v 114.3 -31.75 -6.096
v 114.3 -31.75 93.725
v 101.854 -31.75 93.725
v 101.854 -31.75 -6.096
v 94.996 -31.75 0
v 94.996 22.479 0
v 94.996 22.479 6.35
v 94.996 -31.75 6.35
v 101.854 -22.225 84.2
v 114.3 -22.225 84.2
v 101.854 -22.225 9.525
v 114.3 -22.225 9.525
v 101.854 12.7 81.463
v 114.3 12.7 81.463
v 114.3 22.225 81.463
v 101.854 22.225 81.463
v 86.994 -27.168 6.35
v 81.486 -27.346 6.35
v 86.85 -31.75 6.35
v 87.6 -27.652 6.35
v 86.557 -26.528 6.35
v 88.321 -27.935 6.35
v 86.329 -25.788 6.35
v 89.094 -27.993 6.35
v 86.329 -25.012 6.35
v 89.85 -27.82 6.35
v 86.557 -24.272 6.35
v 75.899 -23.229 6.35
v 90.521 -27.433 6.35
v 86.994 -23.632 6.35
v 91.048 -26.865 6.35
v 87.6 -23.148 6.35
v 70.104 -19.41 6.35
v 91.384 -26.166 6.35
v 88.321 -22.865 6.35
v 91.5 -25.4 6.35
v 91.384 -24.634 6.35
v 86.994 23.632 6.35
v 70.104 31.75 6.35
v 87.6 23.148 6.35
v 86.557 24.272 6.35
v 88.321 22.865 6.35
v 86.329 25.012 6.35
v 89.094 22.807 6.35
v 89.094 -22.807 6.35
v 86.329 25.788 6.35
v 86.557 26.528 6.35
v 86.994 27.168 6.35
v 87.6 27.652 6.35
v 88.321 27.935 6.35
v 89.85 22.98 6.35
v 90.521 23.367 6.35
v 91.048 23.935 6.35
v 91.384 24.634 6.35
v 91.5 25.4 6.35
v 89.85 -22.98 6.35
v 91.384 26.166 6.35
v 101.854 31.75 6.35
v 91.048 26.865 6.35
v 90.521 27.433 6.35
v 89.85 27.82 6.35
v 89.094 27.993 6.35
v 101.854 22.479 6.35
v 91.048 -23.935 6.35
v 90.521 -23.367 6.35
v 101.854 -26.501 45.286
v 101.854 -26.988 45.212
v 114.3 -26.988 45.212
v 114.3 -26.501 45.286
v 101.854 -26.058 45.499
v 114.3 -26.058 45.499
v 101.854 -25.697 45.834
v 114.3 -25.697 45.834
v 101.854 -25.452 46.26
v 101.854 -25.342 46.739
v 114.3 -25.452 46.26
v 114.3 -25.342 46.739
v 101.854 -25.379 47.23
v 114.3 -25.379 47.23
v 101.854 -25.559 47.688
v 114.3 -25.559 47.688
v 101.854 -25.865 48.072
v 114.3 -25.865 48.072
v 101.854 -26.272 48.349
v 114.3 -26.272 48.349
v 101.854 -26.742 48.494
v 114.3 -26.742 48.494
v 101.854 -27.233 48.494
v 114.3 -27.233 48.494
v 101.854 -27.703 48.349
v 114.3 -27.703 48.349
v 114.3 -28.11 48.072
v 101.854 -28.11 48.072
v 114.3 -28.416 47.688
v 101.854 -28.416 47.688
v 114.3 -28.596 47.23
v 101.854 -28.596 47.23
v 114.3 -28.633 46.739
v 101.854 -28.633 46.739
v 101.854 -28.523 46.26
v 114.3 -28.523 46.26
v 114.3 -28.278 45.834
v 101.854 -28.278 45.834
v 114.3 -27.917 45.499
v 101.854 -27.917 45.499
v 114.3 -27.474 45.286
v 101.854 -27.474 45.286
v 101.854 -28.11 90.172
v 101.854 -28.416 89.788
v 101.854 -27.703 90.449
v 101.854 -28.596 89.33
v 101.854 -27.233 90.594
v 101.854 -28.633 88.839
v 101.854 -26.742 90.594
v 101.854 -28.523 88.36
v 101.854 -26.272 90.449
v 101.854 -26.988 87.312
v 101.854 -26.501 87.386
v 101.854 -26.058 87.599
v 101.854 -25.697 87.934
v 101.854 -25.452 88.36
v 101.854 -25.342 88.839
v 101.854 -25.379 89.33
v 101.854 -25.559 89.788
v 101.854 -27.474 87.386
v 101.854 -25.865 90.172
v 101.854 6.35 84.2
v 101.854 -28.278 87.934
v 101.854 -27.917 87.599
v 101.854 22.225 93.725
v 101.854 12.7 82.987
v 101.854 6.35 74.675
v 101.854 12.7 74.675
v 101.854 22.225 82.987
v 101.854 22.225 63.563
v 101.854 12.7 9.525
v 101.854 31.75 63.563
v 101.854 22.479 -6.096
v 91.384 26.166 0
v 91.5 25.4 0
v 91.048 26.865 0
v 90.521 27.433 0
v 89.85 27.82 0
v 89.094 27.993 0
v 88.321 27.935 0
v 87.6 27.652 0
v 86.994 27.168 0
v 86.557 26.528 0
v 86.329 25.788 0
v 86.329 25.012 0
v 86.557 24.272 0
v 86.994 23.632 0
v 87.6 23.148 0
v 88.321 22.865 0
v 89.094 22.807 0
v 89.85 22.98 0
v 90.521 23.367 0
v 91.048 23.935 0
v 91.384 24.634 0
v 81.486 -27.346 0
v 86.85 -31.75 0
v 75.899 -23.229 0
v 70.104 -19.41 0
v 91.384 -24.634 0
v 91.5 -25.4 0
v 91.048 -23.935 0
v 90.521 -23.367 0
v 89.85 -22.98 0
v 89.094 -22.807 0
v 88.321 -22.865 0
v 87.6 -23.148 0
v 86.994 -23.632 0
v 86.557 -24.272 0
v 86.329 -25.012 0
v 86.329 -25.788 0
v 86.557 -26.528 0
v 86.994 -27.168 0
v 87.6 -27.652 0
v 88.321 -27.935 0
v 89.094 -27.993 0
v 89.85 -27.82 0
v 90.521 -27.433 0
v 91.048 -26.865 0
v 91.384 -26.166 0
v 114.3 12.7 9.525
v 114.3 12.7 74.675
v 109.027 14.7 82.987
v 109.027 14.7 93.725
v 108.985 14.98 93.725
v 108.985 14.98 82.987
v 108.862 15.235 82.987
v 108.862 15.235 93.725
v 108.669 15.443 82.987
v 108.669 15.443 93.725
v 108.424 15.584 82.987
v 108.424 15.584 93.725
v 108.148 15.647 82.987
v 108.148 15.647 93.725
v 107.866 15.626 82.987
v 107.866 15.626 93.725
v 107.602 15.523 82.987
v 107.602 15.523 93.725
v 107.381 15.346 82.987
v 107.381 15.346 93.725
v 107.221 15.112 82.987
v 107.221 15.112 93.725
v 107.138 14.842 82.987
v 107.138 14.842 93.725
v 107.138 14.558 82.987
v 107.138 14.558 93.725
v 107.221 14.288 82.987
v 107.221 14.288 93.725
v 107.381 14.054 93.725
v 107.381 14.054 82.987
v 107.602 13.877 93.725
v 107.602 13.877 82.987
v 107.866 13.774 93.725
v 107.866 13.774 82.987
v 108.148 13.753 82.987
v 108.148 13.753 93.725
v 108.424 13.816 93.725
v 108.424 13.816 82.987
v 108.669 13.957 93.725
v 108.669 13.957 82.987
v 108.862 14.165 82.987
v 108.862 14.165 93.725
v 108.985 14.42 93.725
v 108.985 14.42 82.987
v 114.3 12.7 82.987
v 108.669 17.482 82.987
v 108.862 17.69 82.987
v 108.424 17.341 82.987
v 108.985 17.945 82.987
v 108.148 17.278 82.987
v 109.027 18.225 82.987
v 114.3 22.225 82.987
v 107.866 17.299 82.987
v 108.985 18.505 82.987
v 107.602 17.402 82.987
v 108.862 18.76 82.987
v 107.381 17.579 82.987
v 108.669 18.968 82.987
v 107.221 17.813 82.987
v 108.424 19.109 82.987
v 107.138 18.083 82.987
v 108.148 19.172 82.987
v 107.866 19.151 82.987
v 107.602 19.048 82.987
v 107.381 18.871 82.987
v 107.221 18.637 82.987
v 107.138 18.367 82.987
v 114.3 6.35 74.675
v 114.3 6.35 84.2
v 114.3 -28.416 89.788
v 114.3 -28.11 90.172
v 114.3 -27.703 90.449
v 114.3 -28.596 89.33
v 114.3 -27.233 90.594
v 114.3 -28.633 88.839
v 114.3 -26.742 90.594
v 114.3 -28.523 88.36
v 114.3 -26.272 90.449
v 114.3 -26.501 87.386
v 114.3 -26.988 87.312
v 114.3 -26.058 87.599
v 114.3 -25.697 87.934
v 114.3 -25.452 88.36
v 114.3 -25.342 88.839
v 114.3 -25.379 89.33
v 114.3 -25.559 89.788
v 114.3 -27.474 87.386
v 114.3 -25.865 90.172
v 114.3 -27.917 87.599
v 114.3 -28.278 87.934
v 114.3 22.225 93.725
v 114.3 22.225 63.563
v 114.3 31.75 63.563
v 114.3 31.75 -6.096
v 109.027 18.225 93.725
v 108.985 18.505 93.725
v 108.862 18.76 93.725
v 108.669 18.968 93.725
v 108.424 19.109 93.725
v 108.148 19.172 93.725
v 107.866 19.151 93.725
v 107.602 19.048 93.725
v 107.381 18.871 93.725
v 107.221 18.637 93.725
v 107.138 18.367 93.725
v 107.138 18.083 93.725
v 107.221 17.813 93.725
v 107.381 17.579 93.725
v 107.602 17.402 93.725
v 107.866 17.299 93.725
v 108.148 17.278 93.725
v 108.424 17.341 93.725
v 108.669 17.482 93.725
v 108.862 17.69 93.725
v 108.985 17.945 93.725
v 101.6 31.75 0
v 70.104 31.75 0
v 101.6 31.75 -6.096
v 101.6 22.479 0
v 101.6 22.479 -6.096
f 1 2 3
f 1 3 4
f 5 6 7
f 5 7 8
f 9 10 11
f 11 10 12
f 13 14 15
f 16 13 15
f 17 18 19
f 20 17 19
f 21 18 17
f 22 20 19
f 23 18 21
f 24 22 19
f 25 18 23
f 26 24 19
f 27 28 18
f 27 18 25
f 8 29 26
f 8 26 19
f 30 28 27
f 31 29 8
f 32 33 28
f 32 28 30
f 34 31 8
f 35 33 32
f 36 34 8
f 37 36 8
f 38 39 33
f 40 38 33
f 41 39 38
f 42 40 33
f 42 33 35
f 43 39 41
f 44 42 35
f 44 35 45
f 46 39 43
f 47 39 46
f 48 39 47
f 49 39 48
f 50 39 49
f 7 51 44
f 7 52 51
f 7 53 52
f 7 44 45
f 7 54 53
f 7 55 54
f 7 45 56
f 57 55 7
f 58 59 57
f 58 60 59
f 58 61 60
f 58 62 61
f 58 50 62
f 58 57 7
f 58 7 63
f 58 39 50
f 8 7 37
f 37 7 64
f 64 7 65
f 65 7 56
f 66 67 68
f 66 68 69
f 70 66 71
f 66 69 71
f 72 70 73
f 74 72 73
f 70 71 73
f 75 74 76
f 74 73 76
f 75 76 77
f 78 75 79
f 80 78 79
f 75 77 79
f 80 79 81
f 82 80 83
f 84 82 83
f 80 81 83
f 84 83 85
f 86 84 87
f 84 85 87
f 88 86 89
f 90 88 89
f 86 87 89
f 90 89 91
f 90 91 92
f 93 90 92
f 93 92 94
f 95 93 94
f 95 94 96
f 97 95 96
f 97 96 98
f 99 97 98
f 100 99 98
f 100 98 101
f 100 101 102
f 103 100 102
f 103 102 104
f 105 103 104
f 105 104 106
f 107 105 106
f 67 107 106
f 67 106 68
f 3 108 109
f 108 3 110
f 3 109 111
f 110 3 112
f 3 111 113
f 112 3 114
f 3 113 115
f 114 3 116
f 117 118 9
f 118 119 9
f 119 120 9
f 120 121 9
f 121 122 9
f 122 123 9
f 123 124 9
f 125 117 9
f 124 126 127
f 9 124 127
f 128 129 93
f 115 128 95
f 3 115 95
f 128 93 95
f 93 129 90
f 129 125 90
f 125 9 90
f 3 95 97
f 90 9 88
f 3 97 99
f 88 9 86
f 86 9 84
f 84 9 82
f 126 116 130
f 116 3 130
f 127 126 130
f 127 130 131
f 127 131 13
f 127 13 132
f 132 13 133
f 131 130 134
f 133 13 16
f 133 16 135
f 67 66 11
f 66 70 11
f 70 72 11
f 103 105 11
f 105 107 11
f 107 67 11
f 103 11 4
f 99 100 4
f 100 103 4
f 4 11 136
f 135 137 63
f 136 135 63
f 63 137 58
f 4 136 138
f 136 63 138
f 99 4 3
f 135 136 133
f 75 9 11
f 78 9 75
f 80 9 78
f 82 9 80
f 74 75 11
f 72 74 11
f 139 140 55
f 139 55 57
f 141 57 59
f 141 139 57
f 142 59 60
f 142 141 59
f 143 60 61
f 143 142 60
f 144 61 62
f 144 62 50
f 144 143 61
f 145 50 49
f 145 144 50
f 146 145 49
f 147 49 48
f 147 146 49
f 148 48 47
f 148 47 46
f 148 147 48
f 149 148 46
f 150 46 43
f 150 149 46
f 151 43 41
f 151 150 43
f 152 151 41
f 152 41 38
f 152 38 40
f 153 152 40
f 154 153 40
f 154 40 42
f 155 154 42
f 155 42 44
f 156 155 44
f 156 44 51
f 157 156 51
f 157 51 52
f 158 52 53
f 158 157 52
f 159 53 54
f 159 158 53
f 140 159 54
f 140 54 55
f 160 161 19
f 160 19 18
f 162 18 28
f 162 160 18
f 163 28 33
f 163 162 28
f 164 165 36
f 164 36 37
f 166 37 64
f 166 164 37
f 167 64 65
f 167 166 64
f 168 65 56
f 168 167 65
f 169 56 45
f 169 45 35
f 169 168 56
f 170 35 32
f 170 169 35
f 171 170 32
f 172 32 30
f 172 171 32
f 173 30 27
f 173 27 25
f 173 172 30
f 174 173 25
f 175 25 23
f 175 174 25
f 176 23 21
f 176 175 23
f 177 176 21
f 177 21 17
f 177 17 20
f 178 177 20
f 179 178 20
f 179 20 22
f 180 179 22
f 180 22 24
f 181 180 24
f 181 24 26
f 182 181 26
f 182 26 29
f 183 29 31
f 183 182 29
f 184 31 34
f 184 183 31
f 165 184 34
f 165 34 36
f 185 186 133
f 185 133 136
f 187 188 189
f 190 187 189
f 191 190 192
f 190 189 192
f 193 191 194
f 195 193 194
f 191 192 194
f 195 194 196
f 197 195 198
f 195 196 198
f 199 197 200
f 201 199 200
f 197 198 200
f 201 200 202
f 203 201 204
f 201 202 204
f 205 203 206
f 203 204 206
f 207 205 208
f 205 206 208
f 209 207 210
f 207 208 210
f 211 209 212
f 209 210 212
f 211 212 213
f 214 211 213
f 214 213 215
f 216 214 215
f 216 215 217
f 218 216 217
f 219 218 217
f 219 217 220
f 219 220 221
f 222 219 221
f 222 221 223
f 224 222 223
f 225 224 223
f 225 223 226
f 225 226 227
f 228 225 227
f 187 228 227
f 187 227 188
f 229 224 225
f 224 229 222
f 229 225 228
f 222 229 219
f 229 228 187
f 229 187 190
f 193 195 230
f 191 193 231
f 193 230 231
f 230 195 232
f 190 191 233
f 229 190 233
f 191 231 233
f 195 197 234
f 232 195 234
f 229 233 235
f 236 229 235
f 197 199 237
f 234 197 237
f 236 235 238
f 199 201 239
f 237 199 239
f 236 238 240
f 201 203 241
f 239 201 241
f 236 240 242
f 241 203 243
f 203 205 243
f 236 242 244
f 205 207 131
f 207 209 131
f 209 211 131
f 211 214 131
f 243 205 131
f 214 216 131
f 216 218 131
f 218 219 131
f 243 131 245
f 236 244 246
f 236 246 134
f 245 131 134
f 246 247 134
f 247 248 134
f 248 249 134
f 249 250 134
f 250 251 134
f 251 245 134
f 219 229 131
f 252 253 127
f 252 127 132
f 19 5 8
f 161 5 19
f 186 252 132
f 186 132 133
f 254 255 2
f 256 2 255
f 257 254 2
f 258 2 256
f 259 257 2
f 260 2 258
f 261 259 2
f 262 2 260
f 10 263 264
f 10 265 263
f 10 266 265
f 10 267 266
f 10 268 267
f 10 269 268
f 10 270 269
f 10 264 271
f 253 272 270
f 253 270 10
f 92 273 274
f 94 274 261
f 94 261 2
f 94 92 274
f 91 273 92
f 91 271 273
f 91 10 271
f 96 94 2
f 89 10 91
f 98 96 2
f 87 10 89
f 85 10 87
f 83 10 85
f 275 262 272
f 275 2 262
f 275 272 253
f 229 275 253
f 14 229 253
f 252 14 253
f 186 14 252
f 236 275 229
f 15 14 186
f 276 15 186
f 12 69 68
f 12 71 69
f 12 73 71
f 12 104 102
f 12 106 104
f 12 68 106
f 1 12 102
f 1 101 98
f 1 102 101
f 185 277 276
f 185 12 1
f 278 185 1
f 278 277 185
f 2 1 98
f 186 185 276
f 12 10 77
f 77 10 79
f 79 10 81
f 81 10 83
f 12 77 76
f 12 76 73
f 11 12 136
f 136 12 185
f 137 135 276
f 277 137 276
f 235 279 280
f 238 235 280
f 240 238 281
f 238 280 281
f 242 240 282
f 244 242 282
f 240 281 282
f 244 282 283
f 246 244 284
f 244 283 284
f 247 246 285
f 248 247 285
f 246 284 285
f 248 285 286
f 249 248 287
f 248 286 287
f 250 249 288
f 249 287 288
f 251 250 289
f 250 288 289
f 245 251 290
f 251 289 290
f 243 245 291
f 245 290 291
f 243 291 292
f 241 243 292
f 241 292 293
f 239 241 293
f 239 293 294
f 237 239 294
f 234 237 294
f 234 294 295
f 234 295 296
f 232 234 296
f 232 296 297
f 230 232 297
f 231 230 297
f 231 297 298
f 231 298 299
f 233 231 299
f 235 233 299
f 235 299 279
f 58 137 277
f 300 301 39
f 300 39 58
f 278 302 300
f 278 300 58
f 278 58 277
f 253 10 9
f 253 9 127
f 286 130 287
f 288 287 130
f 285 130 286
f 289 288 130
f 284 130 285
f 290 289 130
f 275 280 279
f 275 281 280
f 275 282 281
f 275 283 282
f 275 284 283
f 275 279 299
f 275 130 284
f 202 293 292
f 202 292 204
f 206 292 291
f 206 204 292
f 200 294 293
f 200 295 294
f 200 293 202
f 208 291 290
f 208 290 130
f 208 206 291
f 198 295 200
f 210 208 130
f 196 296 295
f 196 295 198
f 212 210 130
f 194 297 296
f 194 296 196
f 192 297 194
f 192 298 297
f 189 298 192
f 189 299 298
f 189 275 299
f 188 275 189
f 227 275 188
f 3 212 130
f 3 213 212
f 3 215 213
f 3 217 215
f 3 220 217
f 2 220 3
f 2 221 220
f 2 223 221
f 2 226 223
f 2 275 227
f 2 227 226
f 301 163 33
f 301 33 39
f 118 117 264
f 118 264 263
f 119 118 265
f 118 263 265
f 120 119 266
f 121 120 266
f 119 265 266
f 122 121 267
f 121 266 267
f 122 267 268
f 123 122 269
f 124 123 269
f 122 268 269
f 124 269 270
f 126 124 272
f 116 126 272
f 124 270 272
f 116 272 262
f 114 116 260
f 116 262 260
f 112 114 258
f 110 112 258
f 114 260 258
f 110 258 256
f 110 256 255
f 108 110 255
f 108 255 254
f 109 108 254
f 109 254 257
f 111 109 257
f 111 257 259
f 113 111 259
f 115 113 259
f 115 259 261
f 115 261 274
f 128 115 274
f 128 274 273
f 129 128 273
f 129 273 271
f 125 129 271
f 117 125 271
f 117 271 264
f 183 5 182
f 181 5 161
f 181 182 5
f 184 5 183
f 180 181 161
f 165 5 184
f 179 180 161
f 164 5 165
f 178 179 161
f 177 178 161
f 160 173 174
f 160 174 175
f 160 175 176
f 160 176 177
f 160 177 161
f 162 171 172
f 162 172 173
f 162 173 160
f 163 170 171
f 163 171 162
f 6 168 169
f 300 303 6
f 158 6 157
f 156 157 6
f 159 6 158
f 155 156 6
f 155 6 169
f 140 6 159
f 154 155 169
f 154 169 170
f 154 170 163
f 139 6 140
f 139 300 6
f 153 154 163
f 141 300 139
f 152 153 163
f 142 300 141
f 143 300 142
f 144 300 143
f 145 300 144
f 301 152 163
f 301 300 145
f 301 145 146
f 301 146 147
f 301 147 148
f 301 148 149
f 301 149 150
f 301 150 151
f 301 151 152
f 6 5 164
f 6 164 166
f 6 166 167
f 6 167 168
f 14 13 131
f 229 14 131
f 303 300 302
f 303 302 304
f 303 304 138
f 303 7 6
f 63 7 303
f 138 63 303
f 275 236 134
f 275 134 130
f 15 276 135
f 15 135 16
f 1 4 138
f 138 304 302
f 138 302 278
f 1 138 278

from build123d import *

# Parameters (mm, degrees)
SKETCH1_R                    = 2.600000007
BOSS_EXTRUDE1_DEPTH          = 6.35
BOSS_EXTRUDE2_DEPTH          = 12.446
SKETCH3_W                    = 74.675000002
SKETCH3_H                    = 34.925
BOSS_EXTRUDE4_DEPTH          = 12.446
SKETCH6_W                    = 12.446
SKETCH6_H                    = 57.212500002
BOSS_EXTRUDE5_DEPTH          = 9.525
SKETCH7_R                    = 1.650000002
CUT_EXTRUDE2_DEPTH           = 1
CUT_EXTRUDE2_DEPTH_BACK      = 45.196
SKETCH8_W                    = 9.525
SKETCH8_H                    = 6.35
BOSS_EXTRUDE6_DEPTH          = 12.446
SKETCH9_W                    = 1.524
SKETCH9_H                    = 9.525
CUT_EXTRUDE_THIN1_DEPTH      = 32.75
CUT_EXTRUDE_THIN1_DEPTH_BACK = 13.446
SKETCH10_R                   = 0.950000005
CUT_EXTRUDE3_DEPTH           = 12.262


with BuildPart() as part:
    # Sketch1 → Boss-Extrude1 (new body)
    with BuildSketch(Plane.XY):
        with BuildLine():
            Line((94.996, -31.75), (86.850341212, -31.75))
            ThreePointArc((86.850341212, -31.75), (78.719342976, -25.251372236), (70.104, -19.41004015))
            Line((70.104, -19.41004015), (70.104, -19.252396247))
            Line((70.104, -19.252396247), (70.104, 22.225))
            Line((70.104, 22.225), (70.104, 31.75))
            Line((70.104, 31.75), (101.6, 31.75))
            Line((101.6, 31.75), (101.6, 22.479))
            Line((101.6, 22.479), (94.996, 22.479))
            Line((94.996, 22.479), (94.996, -31.75))
        make_face()
        with Locations((88.9, -25.4)):
            Circle(SKETCH1_R, mode=Mode.SUBTRACT)
        with Locations((88.9, 25.4)):
            Circle(SKETCH1_R, mode=Mode.SUBTRACT)
    extrude(amount=BOSS_EXTRUDE1_DEPTH)

    # Sketch2 → Boss-Extrude2 (add)
    with BuildSketch(Plane.XY.offset(6.35)):
        Polygon((101.6, 22.479), (101.854, 22.479), (101.854, -31.75), (114.3, -31.75), (114.3, 31.75), (101.6, 31.75), align=None)
    extrude(amount=-BOSS_EXTRUDE2_DEPTH)

    # Sketch3 → Boss-Extrude4 (add)
    with BuildSketch(Plane(origin=(114.3, 0, 0), x_dir=(0, 0, -1), z_dir=(1, 0, 0))):
        Polygon((-6.35, -31.75), (-6.35, 22.225), (-87.375000002, 22.225), (-93.725000002, 22.225), (-93.725000002, -31.75), align=None)
        with Locations((-46.862500001, -4.7625)):
            Rectangle(SKETCH3_W, SKETCH3_H, mode=Mode.SUBTRACT)
    extrude(amount=-BOSS_EXTRUDE4_DEPTH)

    # Sketch6 → Boss-Extrude5 (add)
    with BuildSketch(Plane(origin=(0, 22.225, 0), x_dir=(1, 0, 0), z_dir=(0, 1, 0))):
        with Locations((108.077, -34.956250001)):
            Rectangle(SKETCH6_W, SKETCH6_H)
    extrude(amount=BOSS_EXTRUDE5_DEPTH)

    # Sketch7 → Cut-Extrude2 (cut, two sides)
    with BuildSketch(Plane(origin=(114.3, 0, 0), x_dir=(0, 0, -1), z_dir=(1, 0, 0))) as cut_extrude2_sk:
        with Locations((-88.962500002, -26.9875)):
            Circle(SKETCH7_R)
        with Locations((-46.862500001, -26.9875)):
            Circle(SKETCH7_R)
    extrude(amount=CUT_EXTRUDE2_DEPTH, mode=Mode.SUBTRACT)
    extrude(cut_extrude2_sk.sketch, amount=-CUT_EXTRUDE2_DEPTH_BACK, mode=Mode.SUBTRACT)

    # Sketch8 → Boss-Extrude6 (add)
    with BuildSketch(Plane(origin=(114.3, 0, 0), x_dir=(0, 0, -1), z_dir=(1, 0, 0))):
        with Locations((-79.437500002, 9.525)):
            Rectangle(SKETCH8_W, SKETCH8_H)
    extrude(amount=-BOSS_EXTRUDE6_DEPTH)

    # Sketch9 → Cut-Extrude-Thin1 (cut, two sides)
    with BuildSketch(Plane.ZY.offset(-101.854)) as cut_extrude_thin1_sk:
        with Locations((82.225000002, 17.4625)):
            Rectangle(SKETCH9_W, SKETCH9_H)
    extrude(amount=CUT_EXTRUDE_THIN1_DEPTH, mode=Mode.SUBTRACT)
    extrude(cut_extrude_thin1_sk.sketch, amount=-CUT_EXTRUDE_THIN1_DEPTH_BACK, mode=Mode.SUBTRACT)

    # Sketch10 → Cut-Extrude3 (cut)
    with BuildSketch(Plane.XY.offset(93.725000002)):
        with Locations((108.077, 14.700000064)):
            Circle(SKETCH10_R)
        with Locations((108.077, 18.224999872)):
            Circle(SKETCH10_R)
    extrude(amount=-CUT_EXTRUDE3_DEPTH, mode=Mode.SUBTRACT)


solid = part.part
